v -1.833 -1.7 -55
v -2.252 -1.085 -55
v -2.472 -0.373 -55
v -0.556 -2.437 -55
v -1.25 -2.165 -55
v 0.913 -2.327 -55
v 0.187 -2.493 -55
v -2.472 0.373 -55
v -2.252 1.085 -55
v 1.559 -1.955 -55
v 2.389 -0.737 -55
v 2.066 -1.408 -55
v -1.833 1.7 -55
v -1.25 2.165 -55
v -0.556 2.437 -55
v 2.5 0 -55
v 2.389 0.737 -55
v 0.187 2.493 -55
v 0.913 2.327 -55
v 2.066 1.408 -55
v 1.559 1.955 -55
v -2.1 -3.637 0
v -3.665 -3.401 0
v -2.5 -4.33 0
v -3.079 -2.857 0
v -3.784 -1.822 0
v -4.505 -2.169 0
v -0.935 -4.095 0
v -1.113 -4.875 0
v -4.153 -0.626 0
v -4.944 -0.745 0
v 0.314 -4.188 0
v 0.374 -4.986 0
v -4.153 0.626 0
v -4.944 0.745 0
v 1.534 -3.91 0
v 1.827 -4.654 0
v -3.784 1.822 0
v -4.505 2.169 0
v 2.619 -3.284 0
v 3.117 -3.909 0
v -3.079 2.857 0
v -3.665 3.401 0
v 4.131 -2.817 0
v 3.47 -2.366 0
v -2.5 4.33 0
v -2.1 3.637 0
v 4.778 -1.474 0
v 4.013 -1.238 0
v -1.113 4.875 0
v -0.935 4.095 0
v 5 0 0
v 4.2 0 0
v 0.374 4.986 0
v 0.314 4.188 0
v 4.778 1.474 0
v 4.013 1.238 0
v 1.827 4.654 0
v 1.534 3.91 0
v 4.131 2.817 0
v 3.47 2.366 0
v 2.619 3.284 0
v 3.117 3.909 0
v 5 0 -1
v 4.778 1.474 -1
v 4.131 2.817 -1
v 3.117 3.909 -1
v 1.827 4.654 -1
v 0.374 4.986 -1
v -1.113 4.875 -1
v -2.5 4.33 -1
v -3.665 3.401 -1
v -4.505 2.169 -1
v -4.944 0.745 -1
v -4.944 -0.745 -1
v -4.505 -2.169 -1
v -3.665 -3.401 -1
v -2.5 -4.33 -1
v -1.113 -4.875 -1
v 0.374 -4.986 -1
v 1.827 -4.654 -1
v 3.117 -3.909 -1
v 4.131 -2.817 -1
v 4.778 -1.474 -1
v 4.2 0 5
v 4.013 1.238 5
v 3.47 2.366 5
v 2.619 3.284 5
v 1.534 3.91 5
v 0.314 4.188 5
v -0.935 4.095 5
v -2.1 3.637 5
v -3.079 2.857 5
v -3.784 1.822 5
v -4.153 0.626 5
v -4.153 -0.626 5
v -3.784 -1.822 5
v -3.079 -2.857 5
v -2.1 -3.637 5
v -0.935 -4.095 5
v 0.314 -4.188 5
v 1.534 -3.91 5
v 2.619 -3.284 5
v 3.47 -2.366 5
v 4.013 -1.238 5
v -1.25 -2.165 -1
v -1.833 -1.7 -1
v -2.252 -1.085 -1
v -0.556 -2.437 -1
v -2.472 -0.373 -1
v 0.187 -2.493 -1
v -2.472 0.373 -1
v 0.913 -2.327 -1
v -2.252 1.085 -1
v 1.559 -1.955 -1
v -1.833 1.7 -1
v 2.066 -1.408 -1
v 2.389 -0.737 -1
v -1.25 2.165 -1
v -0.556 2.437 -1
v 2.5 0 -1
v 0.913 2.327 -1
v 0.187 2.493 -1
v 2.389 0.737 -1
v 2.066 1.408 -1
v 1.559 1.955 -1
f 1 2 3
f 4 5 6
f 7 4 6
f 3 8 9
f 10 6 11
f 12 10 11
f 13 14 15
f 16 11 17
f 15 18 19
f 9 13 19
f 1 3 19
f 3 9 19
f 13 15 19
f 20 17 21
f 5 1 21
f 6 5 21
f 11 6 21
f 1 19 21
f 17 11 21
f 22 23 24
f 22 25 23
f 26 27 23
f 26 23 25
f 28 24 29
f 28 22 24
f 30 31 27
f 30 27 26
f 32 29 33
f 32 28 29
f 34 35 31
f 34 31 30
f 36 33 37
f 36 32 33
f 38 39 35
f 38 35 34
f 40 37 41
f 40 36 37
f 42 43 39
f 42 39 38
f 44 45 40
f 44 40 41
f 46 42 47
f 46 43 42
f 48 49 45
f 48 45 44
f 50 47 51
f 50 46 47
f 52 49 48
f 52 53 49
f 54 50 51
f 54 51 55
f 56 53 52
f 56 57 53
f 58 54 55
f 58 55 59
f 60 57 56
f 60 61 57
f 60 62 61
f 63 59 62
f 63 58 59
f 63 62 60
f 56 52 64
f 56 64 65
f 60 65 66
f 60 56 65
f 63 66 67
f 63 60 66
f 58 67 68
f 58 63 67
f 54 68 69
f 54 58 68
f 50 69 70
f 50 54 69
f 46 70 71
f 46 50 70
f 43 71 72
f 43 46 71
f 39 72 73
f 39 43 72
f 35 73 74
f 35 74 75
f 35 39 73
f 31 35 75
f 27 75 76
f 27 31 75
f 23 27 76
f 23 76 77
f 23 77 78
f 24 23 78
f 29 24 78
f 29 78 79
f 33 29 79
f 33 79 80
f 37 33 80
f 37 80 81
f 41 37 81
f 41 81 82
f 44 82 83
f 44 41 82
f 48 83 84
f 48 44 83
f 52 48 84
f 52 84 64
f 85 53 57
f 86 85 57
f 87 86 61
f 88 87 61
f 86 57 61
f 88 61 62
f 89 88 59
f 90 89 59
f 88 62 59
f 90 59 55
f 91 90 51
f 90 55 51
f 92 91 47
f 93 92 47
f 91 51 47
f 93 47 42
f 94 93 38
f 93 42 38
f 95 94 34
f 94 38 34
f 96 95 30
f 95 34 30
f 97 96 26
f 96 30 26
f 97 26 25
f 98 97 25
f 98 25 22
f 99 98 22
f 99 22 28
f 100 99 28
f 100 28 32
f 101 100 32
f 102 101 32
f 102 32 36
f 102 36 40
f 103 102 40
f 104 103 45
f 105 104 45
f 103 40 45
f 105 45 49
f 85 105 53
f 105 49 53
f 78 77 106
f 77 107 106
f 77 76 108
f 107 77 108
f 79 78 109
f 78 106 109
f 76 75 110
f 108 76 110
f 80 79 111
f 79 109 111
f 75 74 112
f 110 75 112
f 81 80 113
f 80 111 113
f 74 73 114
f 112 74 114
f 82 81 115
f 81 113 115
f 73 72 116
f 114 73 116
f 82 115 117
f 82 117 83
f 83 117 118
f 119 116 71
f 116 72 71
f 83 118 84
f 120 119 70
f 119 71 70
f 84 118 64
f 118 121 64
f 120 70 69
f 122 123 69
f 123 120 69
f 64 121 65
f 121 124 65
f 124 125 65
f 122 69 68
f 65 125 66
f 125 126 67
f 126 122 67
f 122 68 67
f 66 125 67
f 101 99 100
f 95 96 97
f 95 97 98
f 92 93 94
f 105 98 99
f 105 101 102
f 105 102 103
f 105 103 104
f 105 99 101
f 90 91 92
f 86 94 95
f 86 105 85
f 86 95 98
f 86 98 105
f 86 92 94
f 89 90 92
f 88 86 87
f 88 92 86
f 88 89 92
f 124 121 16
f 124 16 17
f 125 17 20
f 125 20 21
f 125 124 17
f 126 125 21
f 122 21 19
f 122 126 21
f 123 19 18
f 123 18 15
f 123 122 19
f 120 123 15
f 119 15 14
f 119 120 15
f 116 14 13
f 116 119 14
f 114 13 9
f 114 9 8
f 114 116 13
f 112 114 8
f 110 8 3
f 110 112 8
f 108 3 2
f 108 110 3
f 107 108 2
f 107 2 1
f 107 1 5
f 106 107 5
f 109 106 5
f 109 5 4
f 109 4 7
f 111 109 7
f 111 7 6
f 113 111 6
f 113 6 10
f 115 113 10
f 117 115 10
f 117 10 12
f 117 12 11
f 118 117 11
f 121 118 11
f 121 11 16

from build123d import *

# Parameters (mm, degrees)
F0_R     = 2.5
F1_DEPTH = 55
F2_R     = 4.2
F3_DEPTH = 5
F4_R     = 5
F5_DEPTH = 1


with BuildPart() as f1:
    # F0 (on Top) → F1 (new body)
    with BuildSketch(Plane.XY):
        Circle(F0_R)
    extrude(amount=-F1_DEPTH)

    # F2 (on Top) → F3 (join)
    with BuildSketch(Plane.XY):
        Circle(F2_R)
    extrude(amount=F3_DEPTH)

    # F4 (on Top) → F5 (join)
    with BuildSketch(Plane.XY):
        Circle(F4_R)
    extrude(amount=-F5_DEPTH)


solid = f1.part
